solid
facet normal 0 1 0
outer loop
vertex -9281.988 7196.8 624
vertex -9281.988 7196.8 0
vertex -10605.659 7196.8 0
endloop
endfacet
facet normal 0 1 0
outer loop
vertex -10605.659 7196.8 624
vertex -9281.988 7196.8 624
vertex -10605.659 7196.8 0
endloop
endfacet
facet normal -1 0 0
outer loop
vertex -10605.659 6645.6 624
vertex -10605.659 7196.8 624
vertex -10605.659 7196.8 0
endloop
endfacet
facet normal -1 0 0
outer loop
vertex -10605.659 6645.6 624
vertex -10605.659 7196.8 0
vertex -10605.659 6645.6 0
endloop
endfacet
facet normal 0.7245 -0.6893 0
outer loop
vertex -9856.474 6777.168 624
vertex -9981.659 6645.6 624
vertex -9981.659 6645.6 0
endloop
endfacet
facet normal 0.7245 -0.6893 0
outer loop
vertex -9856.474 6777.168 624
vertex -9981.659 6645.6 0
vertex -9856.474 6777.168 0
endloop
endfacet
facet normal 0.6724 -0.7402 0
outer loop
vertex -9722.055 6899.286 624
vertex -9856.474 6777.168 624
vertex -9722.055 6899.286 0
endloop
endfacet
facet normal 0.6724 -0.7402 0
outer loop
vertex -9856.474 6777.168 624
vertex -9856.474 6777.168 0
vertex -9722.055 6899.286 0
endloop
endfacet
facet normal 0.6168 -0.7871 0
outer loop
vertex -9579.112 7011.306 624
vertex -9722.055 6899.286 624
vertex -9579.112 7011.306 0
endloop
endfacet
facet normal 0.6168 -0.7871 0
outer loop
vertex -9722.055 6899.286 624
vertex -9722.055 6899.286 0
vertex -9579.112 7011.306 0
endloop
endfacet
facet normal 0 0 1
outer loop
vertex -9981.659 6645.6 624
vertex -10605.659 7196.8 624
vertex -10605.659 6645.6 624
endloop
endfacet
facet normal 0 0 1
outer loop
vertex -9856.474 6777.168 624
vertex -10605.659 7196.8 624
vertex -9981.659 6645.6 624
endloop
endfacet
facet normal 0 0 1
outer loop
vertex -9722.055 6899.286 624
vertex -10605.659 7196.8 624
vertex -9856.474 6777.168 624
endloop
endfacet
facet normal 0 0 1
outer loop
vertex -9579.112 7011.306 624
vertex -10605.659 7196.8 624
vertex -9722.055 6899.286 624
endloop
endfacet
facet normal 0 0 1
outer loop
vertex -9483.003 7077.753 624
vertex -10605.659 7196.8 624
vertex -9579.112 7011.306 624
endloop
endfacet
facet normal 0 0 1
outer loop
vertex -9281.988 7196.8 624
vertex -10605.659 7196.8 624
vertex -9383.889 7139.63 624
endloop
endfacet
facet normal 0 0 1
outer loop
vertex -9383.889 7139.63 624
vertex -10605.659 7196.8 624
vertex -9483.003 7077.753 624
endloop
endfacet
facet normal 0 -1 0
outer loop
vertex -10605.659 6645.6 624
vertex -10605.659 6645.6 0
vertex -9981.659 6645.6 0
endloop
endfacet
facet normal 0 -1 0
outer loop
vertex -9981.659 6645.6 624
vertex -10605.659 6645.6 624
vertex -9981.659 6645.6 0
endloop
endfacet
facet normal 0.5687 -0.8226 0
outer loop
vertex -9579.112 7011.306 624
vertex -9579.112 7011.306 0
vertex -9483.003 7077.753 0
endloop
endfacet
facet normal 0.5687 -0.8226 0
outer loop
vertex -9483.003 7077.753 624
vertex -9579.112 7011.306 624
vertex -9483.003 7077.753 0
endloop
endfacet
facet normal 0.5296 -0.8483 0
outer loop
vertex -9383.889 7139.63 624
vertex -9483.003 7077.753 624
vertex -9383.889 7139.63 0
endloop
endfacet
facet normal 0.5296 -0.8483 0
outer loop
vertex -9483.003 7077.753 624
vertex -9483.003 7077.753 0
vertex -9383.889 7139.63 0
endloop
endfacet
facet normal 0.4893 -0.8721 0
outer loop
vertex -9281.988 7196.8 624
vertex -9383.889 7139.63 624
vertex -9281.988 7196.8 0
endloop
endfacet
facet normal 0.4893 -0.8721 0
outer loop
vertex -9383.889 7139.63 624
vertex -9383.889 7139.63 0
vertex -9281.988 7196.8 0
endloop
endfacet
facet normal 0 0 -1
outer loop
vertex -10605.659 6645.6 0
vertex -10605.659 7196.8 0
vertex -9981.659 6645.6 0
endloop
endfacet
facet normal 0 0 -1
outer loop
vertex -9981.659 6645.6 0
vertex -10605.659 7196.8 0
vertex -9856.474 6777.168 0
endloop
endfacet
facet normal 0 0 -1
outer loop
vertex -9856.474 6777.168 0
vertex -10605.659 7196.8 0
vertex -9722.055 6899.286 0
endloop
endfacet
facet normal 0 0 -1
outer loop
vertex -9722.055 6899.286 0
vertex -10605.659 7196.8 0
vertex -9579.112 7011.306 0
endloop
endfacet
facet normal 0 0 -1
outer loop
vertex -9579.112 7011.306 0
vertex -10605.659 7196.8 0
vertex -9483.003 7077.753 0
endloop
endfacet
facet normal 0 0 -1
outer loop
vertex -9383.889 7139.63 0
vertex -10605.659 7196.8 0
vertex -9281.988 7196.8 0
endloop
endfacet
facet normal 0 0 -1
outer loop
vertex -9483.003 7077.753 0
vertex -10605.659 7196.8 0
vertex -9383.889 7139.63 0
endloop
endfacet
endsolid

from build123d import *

# Parameters (mm, degrees)
EXTRUDE_1_DEPTH = 480
SCALE_1_SCALE   = 1.3


with BuildPart() as part:
    # 草图1 → 凸台-拉伸1 (new body)
    with BuildSketch(Plane.XY):
        with BuildLine():
            Line((-8158.198873592, 5112), (-7678.198873592, 5112))
            ThreePointArc((-7678.198873592, 5112), (-7531.058159836, 5261.115346452), (-7368.547684402, 5393.3126292))
            ThreePointArc((-7368.547684402, 5393.3126292), (-7256.775458313, 5468.670521429), (-7139.991111067, 5536))
            Line((-7139.991111067, 5536), (-7619.991111067, 5536))
            Line((-7619.991111067, 5536), (-8158.198873592, 5536))
            Line((-8158.198873592, 5536), (-8158.198873592, 5112))
        make_face()
    extrude(amount=EXTRUDE_1_DEPTH)


with BuildPart() as part_1:
    # 缩放比例1: scaled about (0, 0, 0)
    add(part.part.scale(SCALE_1_SCALE))


solid = part_1.part
